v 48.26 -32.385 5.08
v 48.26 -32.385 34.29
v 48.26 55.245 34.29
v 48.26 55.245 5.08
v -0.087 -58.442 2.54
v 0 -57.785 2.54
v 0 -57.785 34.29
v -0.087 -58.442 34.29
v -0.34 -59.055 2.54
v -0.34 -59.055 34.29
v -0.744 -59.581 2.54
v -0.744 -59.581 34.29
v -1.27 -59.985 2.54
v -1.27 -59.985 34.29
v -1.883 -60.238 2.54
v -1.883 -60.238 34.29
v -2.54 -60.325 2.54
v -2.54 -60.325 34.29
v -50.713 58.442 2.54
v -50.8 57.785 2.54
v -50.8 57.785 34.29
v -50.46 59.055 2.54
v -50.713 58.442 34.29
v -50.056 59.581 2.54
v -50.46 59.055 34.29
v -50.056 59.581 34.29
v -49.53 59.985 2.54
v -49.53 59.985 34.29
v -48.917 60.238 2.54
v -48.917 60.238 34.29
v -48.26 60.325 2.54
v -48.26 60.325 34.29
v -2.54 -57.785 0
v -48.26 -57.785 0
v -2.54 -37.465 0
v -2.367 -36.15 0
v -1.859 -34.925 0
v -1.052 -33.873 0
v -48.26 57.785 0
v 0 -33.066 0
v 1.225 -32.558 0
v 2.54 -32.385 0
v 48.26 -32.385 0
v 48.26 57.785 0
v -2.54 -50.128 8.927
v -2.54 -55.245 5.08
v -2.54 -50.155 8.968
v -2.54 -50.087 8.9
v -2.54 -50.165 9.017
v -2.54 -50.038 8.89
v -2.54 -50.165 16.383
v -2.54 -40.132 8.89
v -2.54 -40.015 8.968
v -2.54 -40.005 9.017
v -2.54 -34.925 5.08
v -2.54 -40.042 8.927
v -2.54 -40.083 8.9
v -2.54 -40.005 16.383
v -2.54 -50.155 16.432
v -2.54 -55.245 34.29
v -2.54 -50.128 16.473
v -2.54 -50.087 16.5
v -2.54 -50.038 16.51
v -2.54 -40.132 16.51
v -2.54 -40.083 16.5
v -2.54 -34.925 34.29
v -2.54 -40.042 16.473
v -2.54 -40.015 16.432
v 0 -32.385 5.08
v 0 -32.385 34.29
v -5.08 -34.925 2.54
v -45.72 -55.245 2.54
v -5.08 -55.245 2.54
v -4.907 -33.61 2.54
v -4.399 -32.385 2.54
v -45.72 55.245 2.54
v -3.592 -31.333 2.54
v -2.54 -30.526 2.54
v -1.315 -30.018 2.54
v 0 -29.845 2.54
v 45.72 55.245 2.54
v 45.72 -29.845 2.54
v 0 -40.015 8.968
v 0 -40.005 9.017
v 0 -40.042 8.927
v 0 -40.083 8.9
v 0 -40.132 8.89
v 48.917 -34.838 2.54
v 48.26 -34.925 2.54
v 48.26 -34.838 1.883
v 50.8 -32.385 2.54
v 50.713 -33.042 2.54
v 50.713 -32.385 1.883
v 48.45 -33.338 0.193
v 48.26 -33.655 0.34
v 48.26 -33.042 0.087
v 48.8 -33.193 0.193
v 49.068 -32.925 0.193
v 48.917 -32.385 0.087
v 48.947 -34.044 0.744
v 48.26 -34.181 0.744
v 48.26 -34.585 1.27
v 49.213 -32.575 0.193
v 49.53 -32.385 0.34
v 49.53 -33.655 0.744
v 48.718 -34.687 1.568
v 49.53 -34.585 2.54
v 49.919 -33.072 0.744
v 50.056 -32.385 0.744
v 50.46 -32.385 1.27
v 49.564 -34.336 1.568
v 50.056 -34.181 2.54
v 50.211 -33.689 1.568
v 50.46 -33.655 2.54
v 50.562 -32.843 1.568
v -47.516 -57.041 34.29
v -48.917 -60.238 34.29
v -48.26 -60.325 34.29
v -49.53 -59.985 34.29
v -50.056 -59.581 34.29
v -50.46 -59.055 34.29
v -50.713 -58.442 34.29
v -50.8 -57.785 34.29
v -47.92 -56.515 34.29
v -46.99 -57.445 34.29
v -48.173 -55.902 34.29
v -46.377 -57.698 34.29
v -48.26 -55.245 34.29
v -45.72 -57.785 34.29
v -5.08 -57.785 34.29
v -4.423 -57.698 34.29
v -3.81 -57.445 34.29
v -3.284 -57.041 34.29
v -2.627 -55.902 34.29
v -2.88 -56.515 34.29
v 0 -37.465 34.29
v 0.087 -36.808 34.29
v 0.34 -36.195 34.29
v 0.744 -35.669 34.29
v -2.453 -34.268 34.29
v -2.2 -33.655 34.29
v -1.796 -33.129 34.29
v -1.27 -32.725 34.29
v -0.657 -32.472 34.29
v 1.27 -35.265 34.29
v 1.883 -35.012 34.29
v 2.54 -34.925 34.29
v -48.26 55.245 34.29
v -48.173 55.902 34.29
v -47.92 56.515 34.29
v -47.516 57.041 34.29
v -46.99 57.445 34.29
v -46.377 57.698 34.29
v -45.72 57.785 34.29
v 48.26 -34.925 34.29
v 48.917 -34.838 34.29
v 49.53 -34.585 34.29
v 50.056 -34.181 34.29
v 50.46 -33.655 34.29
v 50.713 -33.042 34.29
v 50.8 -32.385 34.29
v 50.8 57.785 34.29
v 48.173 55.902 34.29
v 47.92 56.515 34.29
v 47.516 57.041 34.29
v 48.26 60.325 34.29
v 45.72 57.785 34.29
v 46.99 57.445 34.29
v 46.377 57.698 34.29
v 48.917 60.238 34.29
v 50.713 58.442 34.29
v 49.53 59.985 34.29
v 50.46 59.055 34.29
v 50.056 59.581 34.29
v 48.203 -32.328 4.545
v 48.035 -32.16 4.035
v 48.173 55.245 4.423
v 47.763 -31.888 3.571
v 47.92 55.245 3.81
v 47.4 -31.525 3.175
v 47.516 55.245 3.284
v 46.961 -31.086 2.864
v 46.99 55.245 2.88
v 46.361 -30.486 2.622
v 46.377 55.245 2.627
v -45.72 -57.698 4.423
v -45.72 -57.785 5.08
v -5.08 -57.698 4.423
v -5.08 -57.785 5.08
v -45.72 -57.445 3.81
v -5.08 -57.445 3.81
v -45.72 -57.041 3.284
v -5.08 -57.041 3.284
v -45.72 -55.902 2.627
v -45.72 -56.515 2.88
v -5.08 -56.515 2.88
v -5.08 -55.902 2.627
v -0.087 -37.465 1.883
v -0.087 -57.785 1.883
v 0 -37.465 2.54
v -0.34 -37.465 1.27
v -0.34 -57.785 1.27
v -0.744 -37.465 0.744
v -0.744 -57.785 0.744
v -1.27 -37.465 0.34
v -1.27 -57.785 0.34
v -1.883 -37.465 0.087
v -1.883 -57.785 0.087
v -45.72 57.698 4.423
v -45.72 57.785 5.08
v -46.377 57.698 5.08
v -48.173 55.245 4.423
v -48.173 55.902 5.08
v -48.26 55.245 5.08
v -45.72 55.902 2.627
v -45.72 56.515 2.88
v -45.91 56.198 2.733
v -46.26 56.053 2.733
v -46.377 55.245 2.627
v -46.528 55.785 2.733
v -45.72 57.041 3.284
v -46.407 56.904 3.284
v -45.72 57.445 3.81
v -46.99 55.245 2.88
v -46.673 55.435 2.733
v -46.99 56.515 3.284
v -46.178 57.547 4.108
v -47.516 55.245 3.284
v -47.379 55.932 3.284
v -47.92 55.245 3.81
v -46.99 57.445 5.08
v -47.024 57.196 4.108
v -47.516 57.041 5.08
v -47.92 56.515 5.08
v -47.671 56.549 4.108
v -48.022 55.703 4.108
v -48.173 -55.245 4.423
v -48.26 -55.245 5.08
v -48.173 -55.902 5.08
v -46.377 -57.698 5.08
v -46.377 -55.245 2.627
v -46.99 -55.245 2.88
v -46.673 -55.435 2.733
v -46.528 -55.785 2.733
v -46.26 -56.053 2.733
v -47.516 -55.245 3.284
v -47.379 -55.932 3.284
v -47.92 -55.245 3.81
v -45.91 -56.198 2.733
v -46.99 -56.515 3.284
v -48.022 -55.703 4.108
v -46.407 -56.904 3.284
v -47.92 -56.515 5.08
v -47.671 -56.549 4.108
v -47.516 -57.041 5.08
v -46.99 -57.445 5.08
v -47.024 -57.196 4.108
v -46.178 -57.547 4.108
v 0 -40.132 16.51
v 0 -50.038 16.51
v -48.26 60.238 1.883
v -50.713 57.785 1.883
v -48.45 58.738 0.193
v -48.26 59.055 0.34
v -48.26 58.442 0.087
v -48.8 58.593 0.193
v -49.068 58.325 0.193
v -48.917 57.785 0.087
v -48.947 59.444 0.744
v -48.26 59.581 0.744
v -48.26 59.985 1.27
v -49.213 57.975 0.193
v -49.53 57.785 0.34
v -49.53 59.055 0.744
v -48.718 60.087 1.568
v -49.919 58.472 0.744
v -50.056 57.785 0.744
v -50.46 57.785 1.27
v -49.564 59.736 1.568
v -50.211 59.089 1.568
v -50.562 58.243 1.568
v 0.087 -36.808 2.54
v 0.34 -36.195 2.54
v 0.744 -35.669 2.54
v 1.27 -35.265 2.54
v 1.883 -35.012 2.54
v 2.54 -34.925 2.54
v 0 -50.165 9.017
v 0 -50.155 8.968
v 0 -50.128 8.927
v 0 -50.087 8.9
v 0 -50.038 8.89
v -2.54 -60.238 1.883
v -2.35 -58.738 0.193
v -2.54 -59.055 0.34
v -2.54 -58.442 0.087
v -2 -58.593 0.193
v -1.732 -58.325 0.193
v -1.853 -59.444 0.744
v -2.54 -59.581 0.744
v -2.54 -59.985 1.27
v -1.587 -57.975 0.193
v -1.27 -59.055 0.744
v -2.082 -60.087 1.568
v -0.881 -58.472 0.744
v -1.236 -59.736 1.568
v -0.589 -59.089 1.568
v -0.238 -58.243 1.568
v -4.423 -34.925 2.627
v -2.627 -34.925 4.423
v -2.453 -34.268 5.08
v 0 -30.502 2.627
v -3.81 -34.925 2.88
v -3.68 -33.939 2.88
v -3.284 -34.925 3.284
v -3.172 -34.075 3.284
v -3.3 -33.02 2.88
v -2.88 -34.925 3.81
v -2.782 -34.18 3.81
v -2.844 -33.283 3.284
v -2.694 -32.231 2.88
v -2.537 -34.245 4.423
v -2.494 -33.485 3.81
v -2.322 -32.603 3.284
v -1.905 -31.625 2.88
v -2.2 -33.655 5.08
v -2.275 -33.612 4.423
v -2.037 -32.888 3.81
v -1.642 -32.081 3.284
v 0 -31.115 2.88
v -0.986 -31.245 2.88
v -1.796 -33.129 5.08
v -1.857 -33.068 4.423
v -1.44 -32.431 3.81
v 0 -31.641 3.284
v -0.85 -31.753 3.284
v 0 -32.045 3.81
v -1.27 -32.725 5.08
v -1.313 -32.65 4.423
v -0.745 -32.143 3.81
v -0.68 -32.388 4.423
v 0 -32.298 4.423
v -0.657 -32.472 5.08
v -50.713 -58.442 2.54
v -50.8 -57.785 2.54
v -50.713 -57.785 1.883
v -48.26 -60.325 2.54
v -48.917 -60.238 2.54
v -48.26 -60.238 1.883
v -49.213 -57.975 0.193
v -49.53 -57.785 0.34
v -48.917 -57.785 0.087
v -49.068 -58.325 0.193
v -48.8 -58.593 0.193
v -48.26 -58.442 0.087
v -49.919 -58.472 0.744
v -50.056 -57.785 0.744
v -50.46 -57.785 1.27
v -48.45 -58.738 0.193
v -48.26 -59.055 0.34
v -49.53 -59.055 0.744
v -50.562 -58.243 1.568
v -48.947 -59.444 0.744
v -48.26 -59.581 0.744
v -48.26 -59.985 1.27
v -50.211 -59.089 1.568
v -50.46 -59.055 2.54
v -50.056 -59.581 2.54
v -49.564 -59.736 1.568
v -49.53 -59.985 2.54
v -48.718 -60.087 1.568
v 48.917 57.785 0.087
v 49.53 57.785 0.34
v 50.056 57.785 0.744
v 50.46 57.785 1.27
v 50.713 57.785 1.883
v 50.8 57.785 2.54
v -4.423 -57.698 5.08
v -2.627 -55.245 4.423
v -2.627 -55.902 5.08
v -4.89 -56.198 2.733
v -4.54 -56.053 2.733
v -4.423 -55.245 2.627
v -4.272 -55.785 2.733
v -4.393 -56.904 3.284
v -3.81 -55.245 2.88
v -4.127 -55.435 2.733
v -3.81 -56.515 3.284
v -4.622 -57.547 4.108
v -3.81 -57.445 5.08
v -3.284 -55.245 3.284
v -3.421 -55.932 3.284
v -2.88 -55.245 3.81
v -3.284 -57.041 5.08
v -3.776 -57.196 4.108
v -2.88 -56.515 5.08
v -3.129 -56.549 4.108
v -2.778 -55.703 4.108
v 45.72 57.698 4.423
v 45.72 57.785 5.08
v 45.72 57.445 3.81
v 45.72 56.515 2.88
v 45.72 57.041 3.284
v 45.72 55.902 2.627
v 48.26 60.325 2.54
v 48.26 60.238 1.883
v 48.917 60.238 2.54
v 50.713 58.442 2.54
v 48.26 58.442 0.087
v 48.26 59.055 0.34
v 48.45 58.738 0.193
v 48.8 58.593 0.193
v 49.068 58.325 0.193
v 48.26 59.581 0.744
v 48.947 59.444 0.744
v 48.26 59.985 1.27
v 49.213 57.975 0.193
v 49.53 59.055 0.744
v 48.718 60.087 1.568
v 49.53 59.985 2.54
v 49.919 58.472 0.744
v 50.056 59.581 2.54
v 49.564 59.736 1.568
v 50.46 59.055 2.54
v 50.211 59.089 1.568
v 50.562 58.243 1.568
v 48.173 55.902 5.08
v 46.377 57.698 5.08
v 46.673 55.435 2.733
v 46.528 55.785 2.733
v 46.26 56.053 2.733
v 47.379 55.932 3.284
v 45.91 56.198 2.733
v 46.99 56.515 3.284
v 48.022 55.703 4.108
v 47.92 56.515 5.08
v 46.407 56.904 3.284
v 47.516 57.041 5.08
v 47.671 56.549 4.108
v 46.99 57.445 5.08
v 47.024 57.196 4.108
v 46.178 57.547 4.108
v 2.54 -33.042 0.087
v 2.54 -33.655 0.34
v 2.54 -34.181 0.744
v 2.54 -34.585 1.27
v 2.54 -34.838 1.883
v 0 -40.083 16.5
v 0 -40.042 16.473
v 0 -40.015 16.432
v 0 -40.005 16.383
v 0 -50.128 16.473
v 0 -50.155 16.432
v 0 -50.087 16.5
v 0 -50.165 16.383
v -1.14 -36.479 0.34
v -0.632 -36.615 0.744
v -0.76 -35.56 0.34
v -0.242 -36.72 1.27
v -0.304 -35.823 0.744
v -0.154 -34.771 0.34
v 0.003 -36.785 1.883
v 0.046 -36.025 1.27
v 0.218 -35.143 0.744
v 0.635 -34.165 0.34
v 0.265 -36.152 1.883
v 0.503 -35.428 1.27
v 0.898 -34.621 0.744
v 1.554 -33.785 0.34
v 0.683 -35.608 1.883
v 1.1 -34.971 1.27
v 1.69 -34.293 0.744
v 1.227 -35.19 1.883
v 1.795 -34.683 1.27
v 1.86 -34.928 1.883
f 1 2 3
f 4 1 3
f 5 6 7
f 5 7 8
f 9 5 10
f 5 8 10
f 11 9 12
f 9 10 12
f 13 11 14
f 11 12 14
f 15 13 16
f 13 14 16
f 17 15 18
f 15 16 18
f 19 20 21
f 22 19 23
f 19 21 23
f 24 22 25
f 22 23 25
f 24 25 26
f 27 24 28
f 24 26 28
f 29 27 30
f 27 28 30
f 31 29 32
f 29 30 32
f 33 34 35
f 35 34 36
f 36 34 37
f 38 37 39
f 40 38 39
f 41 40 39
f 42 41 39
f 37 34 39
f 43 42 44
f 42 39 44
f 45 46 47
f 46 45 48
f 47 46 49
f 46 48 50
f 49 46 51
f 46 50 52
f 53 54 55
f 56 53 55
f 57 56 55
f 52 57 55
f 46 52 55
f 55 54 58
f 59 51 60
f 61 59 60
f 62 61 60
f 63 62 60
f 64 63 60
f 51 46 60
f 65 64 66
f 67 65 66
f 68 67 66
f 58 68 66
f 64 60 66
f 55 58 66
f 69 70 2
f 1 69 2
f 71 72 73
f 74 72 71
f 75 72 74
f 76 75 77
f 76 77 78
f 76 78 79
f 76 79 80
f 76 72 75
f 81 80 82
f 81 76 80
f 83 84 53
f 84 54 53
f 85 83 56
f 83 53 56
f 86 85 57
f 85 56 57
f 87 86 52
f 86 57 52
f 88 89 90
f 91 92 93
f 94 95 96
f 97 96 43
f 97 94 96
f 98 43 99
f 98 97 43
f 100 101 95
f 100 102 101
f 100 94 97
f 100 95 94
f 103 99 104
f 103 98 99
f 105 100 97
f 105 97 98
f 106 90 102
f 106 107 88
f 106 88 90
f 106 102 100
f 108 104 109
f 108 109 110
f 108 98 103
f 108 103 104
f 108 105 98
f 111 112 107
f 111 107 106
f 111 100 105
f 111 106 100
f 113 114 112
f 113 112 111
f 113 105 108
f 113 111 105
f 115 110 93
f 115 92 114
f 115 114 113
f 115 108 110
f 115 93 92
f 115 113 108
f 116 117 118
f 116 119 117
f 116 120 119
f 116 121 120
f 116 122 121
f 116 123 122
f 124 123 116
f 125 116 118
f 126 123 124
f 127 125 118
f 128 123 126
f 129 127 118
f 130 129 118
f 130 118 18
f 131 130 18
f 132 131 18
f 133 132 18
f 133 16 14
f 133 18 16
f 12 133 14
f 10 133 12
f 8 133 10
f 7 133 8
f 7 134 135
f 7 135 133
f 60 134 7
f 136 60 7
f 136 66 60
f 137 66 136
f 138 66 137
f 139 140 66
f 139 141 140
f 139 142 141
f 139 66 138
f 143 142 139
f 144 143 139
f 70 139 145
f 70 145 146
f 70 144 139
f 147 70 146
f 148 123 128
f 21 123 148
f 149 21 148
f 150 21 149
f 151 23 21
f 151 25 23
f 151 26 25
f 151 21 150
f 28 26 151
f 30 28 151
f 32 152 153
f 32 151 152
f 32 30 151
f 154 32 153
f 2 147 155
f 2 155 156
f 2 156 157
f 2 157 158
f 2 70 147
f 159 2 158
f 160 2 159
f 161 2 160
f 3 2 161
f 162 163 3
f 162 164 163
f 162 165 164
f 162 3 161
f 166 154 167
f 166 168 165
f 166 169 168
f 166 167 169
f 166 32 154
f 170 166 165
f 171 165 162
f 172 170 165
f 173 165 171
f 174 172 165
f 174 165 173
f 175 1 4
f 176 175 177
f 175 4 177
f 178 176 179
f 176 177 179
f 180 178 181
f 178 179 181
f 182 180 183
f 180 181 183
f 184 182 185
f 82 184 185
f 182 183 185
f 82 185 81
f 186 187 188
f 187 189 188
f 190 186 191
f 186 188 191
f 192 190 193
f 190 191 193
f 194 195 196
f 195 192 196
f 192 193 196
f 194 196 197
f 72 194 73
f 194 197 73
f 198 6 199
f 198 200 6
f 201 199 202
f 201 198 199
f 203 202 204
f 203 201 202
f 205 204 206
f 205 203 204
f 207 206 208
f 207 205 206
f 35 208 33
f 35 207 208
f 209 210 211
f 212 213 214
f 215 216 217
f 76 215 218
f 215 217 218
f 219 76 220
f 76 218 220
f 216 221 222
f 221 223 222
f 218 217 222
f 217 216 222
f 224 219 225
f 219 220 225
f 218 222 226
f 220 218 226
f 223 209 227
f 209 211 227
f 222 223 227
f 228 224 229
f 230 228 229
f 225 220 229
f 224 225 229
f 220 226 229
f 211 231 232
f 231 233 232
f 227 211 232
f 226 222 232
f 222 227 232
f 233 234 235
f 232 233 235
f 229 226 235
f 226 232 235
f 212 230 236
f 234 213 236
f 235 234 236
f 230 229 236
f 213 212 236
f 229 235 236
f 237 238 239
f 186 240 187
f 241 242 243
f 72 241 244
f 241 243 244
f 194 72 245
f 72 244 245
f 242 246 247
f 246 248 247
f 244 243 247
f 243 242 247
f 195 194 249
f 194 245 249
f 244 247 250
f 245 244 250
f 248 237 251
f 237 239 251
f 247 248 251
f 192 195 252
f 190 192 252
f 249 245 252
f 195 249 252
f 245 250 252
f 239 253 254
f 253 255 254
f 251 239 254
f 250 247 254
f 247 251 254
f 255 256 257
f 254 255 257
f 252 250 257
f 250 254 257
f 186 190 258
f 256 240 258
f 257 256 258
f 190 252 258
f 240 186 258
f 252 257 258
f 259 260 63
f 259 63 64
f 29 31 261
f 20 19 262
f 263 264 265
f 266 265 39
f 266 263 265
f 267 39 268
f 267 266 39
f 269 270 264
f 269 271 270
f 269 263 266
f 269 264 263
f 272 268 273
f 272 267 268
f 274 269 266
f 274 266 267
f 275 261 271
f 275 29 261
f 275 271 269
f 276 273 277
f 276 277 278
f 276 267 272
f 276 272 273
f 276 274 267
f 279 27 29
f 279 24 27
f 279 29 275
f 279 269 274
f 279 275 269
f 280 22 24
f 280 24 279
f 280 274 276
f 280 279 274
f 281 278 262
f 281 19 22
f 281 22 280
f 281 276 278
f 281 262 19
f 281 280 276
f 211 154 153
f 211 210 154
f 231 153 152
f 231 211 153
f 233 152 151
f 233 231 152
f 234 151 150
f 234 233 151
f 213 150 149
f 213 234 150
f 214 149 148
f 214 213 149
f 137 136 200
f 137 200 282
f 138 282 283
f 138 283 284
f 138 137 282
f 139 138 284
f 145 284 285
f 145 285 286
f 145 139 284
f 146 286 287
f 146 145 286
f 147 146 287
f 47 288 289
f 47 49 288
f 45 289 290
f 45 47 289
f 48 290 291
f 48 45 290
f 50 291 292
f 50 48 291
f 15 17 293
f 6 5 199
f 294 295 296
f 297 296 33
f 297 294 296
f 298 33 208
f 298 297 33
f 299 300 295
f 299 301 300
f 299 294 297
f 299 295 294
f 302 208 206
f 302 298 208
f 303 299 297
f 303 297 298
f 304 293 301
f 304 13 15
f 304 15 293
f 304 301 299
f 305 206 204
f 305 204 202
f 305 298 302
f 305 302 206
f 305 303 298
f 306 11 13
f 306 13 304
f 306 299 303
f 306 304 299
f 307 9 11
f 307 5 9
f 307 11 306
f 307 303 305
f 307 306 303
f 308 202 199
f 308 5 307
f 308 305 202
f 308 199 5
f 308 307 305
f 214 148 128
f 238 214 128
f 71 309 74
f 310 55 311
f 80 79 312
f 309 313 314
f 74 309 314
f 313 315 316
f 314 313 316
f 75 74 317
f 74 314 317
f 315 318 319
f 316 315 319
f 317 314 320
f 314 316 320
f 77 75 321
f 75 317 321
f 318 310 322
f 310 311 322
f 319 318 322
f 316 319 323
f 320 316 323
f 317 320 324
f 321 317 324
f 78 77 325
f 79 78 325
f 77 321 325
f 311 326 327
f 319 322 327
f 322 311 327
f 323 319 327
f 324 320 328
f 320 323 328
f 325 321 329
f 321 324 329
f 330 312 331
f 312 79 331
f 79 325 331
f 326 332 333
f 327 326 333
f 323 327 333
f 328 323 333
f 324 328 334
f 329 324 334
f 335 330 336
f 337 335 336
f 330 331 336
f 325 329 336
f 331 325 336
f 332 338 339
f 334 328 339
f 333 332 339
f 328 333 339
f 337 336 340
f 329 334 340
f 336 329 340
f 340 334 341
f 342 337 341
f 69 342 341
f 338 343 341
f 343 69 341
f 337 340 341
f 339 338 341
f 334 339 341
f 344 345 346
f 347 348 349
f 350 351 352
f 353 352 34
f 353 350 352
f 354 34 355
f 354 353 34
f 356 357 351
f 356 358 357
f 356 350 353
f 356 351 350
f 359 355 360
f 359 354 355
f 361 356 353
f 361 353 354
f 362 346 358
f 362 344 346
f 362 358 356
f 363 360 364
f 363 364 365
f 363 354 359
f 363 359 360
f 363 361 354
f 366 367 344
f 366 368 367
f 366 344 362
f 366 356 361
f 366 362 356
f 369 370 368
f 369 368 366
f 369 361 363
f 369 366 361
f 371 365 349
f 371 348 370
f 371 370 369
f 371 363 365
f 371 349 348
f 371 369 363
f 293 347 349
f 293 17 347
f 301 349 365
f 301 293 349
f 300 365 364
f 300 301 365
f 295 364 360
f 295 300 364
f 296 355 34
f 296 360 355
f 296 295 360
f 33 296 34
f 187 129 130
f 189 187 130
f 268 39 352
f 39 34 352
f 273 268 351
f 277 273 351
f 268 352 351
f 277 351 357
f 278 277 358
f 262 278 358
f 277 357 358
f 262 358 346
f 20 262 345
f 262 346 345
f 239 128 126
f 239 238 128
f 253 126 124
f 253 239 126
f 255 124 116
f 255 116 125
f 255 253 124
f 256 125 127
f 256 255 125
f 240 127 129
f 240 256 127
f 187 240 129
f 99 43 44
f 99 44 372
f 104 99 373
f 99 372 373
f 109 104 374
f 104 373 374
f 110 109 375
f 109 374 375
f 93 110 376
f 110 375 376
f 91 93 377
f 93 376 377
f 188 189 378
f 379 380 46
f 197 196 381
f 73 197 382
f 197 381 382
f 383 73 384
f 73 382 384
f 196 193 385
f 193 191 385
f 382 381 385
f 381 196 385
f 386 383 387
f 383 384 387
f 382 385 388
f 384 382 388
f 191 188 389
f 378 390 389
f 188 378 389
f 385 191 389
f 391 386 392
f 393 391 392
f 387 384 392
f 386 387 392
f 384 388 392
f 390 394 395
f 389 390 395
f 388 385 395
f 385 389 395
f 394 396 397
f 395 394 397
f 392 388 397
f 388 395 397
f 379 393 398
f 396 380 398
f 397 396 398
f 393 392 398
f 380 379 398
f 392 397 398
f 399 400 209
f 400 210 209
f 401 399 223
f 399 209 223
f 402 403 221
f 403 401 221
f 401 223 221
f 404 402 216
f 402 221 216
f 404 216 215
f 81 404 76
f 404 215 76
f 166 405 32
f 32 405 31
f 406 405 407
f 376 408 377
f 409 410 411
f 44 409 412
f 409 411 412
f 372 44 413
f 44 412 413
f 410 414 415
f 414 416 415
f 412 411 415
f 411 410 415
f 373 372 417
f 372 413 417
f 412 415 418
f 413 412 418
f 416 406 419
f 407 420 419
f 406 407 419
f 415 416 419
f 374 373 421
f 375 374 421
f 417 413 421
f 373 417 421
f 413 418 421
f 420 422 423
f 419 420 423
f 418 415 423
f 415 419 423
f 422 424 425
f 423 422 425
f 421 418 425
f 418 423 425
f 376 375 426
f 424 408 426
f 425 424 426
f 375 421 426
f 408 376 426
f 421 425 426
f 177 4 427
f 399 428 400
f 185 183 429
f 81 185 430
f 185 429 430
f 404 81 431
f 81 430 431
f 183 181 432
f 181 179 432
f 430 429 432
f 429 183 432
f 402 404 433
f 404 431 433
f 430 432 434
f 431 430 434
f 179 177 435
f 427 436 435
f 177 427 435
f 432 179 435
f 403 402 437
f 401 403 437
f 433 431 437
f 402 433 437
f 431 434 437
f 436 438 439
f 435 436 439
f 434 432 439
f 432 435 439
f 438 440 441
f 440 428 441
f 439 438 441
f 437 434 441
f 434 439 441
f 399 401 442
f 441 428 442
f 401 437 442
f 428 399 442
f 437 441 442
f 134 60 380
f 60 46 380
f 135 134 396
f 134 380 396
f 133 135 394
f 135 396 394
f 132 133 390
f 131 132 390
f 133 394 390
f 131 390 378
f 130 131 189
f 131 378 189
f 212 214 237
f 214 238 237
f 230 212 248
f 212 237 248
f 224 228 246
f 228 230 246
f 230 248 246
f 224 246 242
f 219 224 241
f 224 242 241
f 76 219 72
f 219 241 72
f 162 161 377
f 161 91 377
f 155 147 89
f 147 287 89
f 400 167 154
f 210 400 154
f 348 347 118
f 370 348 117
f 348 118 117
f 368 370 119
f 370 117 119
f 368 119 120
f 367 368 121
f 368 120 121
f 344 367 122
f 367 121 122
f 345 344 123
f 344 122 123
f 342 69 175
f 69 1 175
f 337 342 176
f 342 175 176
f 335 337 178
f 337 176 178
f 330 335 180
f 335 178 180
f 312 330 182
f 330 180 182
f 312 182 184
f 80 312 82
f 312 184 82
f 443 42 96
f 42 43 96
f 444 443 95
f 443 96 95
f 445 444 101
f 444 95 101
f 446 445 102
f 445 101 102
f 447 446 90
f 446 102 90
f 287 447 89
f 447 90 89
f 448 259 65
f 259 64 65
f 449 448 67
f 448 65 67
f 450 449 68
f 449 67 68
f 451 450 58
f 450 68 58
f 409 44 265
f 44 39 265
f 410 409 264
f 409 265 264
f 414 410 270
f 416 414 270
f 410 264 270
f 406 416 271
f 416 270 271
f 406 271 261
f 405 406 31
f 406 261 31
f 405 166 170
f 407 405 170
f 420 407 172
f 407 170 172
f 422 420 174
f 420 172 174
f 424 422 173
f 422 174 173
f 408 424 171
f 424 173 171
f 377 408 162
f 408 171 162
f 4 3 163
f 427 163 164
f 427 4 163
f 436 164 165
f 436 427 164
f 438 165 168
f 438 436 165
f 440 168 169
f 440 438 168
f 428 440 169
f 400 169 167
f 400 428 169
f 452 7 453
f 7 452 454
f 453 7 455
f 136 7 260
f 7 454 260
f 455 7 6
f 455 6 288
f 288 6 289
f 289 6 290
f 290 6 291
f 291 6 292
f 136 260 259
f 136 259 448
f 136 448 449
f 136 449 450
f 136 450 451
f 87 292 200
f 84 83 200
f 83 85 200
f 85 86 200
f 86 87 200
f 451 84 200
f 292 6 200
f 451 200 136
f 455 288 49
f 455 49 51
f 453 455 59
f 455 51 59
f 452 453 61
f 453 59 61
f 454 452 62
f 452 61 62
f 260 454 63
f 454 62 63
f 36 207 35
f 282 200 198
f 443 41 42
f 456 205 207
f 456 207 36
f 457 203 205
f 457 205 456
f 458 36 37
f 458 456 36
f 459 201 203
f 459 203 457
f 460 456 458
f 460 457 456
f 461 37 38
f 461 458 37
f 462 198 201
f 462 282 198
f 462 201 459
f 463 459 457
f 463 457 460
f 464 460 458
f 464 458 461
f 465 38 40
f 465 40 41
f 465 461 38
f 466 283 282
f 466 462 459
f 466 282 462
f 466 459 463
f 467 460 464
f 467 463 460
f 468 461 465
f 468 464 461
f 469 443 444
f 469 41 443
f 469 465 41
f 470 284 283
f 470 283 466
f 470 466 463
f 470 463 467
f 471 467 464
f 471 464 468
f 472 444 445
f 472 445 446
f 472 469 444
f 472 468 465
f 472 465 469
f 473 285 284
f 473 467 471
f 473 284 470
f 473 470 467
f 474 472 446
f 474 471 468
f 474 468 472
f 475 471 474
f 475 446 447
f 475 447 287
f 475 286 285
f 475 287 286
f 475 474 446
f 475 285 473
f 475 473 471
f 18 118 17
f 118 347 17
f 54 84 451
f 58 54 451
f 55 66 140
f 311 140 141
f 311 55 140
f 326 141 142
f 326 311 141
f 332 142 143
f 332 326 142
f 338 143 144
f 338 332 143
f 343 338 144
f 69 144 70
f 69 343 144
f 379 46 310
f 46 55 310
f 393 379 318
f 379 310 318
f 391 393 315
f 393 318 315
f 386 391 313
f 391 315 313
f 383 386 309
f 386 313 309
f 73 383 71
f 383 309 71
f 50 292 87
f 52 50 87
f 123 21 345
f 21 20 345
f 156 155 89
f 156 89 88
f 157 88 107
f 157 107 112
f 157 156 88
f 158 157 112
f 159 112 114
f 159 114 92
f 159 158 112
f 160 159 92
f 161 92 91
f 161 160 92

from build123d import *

# Parameters (mm, degrees)
F1_DEPTH = 34.29
F3_DEPTH = 31.75
F4_W     = 10.16
F4_H     = 7.62
F5_DEPTH = 2.54
F6_R     = 0.127
F7_R     = 2.54


with BuildPart() as f1:
    # F0 (on Top) → F1 (new body)
    with BuildSketch(Plane.XY):
        Polygon((50.8, 60.325), (-50.8, 60.325), (-50.8, -60.325), (0, -60.325), (0, -34.925), (50.8, -34.925), align=None)
    extrude(amount=F1_DEPTH)

    # F2 (on face) → F3 (cut)
    with BuildSketch(Plane.XY.offset(34.29)):
        Polygon((48.26, -32.385), (48.26, 57.785), (-48.26, 57.785), (-48.26, -57.785), (-2.54, -57.785), (-2.54, -32.385), align=None)
    extrude(amount=-F3_DEPTH, mode=Mode.SUBTRACT)

    # F4 (on face) → F5 (cut, through all)
    with BuildSketch(Plane.YZ):
        with Locations((-45.085, 12.7)):
            Rectangle(F4_W, F4_H)
    extrude(amount=-F5_DEPTH, mode=Mode.SUBTRACT)

    # F6
    f6_edges = [f1.edges().sort_by_distance(p)[0] for p in [
        (-1.27, -50.165, 16.51),
        (-1.27, -40.005, 16.51),
        (-1.27, -40.005, 8.89),
        (-1.27, -50.165, 8.89),
    ]]
    fillet(f6_edges, radius=F6_R)

    # F7
    f7_edges = [f1.edges().sort_by_distance(p)[0] for p in [
        (50.8, -34.925, 17.145),
        (0, -34.925, 17.145),
        (0, -60.325, 17.145),
        (-2.54, -32.385, 18.415),
        (-50.8, -60.325, 17.145),
        (-2.54, -57.785, 18.415),
        (-48.26, -57.785, 18.415),
        (50.8, 60.325, 17.145),
        (48.26, 57.785, 18.415),
        (-48.26, 57.785, 18.415),
        (-50.8, 60.325, 17.145),
        (0, 60.325, 0),
        (-50.8, 0, 0),
        (-25.4, -60.325, 0),
        (0, -47.625, 0),
        (25.4, -34.925, 0),
        (50.8, 12.7, 0),
        (48.26, 12.7, 2.54),
        (0, 57.785, 2.54),
        (-48.26, 0, 2.54),
        (-25.4, -57.785, 2.54),
        (-2.54, -45.085, 2.54),
        (22.86, -32.385, 2.54),
    ]]
    fillet(f7_edges, radius=F7_R)


solid = f1.part
